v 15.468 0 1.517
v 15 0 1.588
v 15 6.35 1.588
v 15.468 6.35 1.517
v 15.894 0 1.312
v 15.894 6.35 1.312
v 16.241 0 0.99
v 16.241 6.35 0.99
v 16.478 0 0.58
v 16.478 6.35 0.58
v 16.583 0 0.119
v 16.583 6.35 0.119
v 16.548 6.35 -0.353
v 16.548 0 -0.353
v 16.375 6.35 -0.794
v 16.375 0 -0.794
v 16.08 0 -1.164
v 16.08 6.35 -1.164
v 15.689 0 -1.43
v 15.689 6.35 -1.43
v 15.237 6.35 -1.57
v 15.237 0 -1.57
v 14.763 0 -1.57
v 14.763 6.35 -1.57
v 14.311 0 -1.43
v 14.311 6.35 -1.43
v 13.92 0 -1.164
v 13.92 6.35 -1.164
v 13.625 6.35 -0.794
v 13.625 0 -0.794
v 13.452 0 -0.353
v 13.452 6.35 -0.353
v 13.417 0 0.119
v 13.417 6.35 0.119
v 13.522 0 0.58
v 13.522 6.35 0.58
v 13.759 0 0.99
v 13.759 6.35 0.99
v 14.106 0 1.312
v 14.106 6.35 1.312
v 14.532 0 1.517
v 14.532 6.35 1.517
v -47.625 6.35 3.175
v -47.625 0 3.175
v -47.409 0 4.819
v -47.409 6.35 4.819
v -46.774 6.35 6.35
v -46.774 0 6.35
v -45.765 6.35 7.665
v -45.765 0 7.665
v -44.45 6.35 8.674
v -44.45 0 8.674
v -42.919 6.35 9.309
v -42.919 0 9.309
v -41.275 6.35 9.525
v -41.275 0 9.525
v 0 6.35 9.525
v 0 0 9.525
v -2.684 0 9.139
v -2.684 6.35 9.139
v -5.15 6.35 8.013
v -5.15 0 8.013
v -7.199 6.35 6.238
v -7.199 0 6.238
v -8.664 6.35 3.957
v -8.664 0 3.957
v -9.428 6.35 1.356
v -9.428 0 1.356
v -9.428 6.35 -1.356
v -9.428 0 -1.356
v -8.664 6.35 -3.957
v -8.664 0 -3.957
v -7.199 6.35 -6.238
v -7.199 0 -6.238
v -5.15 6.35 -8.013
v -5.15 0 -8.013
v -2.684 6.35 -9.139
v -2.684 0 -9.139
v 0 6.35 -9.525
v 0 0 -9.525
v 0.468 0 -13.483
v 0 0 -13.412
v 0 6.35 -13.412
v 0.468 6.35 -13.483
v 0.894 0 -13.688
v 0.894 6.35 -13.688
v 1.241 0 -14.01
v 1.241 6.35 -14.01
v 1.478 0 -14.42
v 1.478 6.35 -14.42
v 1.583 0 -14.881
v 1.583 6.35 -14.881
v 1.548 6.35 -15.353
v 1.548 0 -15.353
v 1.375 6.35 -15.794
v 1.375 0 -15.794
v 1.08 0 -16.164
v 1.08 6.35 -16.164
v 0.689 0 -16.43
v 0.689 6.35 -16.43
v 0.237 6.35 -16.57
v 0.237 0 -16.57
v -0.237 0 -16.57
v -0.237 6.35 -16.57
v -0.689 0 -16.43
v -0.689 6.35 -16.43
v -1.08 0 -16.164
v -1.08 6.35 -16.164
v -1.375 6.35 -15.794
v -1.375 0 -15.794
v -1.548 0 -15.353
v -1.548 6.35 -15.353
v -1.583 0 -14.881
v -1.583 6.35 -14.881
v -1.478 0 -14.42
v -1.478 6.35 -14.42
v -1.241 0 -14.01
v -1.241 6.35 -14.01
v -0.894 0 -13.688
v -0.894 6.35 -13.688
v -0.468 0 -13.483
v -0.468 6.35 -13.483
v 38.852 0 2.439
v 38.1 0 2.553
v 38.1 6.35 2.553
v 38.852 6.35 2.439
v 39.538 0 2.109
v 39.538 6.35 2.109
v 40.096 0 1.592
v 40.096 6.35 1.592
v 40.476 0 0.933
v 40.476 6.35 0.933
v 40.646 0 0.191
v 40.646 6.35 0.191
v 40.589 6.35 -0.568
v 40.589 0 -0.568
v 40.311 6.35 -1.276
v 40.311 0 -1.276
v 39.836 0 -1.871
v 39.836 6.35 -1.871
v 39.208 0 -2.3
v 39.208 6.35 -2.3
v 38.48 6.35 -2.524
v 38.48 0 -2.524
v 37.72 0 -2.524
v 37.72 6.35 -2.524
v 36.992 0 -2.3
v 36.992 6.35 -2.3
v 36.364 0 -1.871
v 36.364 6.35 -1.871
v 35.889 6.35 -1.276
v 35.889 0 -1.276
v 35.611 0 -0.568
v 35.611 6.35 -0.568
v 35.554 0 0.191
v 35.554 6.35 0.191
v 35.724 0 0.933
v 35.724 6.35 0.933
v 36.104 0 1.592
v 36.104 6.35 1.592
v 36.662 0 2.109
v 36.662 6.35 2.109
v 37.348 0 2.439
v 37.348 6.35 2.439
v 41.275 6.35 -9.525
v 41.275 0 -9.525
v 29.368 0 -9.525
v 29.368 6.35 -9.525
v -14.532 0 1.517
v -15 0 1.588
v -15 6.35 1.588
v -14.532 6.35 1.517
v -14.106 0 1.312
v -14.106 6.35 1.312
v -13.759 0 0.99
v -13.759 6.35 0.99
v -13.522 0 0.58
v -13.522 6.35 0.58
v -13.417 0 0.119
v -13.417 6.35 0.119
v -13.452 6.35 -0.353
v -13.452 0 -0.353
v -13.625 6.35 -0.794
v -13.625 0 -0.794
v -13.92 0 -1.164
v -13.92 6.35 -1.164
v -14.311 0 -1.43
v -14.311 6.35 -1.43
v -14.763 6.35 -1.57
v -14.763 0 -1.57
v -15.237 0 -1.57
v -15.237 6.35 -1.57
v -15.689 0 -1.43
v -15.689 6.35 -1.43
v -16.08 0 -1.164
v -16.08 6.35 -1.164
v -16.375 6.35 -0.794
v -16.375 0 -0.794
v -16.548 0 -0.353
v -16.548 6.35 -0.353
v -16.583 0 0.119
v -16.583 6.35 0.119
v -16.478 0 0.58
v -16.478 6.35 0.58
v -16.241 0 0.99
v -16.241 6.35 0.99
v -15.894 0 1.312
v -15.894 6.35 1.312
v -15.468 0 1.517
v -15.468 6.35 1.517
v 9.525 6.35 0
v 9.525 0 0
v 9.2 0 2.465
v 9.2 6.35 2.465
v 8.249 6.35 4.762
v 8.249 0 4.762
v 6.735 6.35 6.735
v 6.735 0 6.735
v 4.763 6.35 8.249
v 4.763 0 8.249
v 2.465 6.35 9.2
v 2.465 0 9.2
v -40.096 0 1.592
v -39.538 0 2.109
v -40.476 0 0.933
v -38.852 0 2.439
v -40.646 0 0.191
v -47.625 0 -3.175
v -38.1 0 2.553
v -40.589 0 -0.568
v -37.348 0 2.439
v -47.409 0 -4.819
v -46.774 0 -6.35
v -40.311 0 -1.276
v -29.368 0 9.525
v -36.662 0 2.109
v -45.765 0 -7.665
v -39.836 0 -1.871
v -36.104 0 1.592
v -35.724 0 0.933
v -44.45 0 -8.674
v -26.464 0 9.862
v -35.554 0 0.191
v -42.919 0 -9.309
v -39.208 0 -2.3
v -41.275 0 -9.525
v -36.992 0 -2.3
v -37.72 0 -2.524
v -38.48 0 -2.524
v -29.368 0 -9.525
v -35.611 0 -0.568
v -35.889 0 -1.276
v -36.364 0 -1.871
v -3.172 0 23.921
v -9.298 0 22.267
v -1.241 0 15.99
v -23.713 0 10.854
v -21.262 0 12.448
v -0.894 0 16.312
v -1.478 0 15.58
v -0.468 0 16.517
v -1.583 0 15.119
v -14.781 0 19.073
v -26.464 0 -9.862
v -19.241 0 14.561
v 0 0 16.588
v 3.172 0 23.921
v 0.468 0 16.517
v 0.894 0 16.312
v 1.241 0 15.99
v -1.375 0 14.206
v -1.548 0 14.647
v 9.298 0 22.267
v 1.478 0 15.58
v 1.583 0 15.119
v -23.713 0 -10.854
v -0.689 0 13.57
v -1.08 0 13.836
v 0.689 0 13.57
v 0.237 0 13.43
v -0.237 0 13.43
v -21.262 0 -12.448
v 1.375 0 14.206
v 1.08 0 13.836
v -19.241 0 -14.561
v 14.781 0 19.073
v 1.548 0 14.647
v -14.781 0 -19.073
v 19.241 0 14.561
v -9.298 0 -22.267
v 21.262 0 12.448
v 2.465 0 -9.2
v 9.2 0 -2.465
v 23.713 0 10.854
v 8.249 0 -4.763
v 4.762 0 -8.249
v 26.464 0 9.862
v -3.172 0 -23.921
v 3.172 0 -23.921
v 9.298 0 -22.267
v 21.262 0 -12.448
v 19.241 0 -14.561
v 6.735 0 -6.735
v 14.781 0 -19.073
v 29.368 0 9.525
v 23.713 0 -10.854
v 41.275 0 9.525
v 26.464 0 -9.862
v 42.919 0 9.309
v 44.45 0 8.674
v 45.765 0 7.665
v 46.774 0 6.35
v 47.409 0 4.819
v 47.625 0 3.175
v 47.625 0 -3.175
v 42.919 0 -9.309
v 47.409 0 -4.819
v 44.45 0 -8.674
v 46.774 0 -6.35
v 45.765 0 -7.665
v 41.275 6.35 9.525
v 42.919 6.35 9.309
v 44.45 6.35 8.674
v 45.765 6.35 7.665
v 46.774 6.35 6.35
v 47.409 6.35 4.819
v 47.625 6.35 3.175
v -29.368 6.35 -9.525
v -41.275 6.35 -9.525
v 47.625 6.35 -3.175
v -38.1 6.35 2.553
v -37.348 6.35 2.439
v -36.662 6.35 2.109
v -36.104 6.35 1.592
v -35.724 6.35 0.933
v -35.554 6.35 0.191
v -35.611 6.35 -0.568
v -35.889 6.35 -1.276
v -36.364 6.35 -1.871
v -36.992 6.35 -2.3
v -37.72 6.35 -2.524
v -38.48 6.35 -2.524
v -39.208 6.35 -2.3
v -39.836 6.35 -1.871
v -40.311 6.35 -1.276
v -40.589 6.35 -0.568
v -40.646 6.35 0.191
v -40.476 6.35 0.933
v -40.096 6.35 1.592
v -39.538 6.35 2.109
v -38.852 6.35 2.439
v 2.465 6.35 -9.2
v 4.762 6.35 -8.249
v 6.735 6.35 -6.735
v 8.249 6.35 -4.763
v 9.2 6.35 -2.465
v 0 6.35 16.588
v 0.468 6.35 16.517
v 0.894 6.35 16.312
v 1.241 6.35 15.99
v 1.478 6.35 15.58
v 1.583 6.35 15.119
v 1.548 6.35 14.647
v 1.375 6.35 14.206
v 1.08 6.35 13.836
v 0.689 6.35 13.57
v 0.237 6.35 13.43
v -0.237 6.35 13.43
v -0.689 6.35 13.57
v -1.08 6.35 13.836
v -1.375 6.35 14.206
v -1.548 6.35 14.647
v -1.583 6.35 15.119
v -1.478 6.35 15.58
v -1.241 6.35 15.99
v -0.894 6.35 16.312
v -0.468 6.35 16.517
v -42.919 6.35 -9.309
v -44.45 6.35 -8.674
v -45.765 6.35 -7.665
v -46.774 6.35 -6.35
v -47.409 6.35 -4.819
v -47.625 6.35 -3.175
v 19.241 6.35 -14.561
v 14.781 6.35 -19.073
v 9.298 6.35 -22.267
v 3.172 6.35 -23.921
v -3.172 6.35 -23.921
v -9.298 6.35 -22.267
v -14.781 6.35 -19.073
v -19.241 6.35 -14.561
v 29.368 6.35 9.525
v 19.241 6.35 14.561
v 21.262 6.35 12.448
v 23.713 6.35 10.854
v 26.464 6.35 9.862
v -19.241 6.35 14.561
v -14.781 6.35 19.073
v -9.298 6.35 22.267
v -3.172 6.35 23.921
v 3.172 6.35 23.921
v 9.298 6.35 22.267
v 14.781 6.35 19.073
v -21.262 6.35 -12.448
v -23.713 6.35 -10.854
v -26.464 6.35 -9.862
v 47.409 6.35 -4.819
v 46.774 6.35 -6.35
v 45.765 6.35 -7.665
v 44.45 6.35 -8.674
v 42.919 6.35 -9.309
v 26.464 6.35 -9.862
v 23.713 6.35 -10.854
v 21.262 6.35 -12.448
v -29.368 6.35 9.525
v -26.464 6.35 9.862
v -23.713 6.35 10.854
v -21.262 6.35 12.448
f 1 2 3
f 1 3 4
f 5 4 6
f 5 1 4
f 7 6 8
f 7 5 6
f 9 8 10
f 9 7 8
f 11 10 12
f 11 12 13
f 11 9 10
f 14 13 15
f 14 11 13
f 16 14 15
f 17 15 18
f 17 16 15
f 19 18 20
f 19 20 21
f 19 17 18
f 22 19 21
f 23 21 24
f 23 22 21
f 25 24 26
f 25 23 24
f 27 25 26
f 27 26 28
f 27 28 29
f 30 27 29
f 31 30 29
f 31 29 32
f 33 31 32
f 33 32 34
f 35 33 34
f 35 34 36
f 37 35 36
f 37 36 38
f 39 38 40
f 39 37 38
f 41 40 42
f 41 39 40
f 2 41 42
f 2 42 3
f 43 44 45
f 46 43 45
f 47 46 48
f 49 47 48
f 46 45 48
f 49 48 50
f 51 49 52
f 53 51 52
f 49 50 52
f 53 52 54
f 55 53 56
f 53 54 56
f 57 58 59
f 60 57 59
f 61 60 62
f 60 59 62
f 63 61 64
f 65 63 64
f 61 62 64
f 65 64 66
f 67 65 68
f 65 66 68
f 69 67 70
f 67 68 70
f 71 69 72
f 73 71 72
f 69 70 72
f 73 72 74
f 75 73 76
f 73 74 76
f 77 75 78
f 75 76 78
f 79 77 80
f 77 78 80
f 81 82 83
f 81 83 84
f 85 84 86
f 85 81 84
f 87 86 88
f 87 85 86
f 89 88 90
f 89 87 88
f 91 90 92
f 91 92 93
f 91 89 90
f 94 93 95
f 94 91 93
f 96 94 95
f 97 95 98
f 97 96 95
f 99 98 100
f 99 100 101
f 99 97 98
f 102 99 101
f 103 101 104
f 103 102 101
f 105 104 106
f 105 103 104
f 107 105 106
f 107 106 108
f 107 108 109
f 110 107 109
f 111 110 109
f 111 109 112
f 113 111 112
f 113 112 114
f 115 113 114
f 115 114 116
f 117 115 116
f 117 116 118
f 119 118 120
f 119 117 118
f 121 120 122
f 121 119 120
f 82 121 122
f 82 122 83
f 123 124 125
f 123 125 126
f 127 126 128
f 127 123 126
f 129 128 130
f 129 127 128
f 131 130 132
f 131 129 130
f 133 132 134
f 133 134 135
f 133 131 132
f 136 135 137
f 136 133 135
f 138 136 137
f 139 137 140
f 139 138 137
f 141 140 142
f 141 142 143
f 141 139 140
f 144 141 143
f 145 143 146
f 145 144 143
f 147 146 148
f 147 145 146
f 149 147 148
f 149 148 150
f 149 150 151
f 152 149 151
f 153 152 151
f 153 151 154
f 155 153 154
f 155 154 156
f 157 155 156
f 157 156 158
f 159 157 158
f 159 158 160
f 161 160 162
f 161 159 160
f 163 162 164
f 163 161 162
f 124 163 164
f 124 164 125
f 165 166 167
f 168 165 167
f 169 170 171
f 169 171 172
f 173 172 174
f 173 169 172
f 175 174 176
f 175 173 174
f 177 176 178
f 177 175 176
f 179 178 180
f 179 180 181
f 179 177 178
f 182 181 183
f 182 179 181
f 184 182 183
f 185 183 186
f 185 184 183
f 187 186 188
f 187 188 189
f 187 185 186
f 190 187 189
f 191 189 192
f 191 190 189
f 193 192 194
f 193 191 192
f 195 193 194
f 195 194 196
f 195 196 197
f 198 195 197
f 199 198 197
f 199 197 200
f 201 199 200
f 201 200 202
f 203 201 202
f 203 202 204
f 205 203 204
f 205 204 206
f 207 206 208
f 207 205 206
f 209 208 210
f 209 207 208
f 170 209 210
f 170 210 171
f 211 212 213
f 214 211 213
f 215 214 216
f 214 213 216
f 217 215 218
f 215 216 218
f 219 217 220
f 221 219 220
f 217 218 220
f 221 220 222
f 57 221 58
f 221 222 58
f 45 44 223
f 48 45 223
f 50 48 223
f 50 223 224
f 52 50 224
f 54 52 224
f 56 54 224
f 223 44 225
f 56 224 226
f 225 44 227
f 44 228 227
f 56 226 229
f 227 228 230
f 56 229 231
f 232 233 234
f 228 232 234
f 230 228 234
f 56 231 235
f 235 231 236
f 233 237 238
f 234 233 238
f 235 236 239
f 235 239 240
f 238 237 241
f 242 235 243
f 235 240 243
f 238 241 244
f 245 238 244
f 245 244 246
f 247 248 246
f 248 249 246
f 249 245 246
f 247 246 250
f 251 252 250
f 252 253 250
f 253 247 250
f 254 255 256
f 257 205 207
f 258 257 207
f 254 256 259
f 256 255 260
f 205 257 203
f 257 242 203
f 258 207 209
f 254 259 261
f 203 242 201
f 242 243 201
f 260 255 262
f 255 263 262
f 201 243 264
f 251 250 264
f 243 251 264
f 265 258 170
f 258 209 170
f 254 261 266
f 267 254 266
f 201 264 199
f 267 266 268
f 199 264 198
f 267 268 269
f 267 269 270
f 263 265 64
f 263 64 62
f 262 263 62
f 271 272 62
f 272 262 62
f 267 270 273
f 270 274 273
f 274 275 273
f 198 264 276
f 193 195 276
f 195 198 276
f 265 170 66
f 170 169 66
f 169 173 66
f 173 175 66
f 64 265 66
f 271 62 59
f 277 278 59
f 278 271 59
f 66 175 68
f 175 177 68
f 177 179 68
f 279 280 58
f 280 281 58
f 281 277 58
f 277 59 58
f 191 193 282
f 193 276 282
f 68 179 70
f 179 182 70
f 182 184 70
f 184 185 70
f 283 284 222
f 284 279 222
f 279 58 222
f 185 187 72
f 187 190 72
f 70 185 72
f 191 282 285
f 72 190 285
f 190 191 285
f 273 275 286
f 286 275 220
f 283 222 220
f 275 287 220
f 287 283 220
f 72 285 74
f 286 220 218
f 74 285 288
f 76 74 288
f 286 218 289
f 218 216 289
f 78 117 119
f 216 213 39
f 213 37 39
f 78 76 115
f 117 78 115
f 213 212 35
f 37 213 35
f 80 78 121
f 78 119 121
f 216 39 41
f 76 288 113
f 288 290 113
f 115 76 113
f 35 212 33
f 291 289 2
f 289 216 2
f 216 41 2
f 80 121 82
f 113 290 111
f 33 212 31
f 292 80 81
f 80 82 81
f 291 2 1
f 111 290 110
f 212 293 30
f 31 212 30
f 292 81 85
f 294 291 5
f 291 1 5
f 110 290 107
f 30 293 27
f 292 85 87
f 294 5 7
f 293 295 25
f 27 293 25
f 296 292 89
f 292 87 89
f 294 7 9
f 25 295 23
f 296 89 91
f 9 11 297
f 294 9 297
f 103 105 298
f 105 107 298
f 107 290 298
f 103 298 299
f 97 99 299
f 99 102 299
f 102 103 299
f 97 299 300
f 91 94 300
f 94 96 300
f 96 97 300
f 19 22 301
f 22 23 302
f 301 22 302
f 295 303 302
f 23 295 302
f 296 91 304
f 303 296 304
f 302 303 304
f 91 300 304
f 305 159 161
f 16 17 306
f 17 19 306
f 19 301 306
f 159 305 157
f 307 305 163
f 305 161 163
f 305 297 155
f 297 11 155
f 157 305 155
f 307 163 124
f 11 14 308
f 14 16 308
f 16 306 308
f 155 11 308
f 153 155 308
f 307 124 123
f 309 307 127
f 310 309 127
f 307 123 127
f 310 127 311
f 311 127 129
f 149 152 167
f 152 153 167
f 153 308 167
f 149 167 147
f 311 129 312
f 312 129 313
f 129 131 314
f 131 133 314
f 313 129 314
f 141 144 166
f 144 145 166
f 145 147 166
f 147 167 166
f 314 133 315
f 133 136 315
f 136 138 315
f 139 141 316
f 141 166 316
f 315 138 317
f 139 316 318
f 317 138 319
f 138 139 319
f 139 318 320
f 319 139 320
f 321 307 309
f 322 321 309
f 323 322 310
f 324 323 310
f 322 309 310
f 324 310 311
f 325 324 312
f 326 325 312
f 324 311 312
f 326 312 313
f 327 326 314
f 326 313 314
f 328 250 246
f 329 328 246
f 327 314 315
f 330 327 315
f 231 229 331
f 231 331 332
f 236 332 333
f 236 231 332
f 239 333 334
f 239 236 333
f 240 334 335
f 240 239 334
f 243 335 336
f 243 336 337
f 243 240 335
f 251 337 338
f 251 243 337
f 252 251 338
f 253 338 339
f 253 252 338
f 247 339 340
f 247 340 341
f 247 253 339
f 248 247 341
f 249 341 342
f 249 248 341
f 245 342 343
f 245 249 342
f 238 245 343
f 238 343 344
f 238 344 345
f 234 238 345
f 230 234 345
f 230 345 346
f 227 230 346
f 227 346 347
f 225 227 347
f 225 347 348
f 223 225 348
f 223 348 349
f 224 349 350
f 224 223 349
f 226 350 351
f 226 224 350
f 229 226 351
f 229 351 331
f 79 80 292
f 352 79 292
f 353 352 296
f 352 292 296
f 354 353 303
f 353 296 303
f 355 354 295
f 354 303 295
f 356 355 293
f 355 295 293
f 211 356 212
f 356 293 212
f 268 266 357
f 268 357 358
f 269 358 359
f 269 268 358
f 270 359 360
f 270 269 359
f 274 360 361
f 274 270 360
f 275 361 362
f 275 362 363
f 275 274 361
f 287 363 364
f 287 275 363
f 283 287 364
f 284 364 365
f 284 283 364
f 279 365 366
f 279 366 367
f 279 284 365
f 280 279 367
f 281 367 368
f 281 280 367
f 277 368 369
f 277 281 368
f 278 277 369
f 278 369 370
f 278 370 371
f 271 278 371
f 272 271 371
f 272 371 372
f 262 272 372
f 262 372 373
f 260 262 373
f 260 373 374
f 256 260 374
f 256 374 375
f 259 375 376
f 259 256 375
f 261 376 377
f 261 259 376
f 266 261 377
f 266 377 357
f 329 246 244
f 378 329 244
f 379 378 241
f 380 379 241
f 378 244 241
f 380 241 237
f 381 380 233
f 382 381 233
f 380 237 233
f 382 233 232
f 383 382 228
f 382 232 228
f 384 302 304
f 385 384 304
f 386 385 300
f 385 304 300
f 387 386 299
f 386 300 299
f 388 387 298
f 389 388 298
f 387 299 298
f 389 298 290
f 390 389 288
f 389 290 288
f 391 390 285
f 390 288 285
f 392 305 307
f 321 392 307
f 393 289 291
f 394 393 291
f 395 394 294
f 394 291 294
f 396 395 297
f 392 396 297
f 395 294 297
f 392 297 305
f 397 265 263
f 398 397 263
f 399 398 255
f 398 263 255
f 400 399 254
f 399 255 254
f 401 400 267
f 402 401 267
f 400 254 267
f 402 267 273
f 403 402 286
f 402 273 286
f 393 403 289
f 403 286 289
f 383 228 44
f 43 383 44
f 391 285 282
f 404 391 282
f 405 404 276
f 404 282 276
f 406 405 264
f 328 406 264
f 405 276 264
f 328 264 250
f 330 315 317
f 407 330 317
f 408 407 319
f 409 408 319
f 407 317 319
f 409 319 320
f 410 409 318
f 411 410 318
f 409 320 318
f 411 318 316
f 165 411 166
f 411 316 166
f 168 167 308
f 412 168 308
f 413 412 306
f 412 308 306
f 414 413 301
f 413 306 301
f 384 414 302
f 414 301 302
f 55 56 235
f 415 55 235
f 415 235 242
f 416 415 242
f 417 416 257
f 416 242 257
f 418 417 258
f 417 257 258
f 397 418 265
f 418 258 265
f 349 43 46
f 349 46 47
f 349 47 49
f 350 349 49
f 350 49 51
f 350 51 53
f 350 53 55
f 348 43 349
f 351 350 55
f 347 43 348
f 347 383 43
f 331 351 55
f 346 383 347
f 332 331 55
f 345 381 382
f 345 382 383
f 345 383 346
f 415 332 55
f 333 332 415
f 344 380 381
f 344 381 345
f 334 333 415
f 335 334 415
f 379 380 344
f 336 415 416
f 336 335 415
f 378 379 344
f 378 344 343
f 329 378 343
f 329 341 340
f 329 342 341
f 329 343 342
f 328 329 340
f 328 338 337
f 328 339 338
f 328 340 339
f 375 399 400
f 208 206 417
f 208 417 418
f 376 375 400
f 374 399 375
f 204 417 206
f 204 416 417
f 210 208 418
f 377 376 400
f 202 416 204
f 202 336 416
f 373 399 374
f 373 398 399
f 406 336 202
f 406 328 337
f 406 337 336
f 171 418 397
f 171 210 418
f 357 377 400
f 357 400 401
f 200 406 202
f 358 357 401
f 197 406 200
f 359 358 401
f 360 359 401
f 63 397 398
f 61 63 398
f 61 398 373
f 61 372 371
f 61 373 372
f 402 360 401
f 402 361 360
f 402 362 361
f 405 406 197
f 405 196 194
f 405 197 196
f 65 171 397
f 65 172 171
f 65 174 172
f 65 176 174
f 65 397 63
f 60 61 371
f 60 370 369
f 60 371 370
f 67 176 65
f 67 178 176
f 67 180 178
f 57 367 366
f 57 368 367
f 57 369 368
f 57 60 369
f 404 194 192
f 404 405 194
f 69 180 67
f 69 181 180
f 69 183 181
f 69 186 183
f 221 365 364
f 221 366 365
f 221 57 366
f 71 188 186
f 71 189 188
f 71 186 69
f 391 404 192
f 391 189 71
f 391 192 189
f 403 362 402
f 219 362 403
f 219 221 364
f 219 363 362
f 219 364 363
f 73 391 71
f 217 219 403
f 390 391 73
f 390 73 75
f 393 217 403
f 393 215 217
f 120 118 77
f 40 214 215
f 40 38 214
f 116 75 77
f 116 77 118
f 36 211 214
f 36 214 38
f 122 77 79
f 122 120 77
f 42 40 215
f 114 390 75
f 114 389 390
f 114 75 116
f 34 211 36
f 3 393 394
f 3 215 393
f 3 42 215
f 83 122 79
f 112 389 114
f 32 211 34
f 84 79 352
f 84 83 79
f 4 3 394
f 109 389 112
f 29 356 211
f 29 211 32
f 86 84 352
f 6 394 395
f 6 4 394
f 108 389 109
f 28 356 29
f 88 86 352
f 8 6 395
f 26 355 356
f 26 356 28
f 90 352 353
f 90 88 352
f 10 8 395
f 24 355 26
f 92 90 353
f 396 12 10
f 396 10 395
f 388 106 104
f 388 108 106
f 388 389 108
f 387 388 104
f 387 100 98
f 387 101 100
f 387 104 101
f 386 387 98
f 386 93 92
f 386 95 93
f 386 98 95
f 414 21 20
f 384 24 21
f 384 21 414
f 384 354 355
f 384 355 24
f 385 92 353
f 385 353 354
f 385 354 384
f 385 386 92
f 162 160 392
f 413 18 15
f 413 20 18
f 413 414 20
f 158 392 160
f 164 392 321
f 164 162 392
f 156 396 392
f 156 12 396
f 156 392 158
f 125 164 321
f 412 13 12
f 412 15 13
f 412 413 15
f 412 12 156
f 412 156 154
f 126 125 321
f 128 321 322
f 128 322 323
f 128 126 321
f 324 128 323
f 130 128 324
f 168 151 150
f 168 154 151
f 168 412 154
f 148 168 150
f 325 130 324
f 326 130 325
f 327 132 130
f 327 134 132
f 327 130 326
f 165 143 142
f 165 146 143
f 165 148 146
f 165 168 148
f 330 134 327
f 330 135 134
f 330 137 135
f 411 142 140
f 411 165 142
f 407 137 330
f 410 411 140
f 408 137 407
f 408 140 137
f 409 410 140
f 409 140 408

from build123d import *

# Parameters (mm, degrees)
SKETCH1_R           = 1.5875
SKETCH1_R_2         = 2.5527
BOSS_EXTRUDE2_DEPTH = 6.35


with BuildPart() as part:
    # Sketch1 → Boss-Extrude2 (new body)
    # profile 1 of 10: a face of its own
    with BuildSketch(Plane(origin=(0, 0, 0), x_dir=(1, 0, 0), z_dir=(0, 1, 0))):
        with BuildLine():
            Line((-4.5e-08, 9.525), (-22.170504618, 9.525))
            ThreePointArc((-22.170504618, 9.525), (-24.13, 0), (-22.170504618, -9.525))
            Line((-22.170504618, -9.525), (4.2e-08, -9.525))
            ThreePointArc((4.2e-08, -9.525), (-9.525, -4.4e-08), (-4.5e-08, 9.525))
        make_face()
        with Locations(Location((-15, 0, 0), (0, 0, 270))):
            Circle(SKETCH1_R, mode=Mode.SUBTRACT)
    # profile 2 of 10: a face of its own
    with BuildSketch(Plane(origin=(0, 0, 0), x_dir=(1, 0, 0), z_dir=(0, 1, 0))):
        with BuildLine():
            Line((22.170504618, 9.525), (-4.5e-08, 9.525))
            ThreePointArc((-4.5e-08, 9.525), (6.735192075, 6.735192107), (9.525, 0))
            ThreePointArc((9.525, 0), (6.735192106, -6.735192076), (4.2e-08, -9.525))
            Line((4.2e-08, -9.525), (22.170504618, -9.525))
            ThreePointArc((22.170504618, -9.525), (23.635049994, -4.86223321), (24.13, 0))
            ThreePointArc((24.13, 0), (23.635049994, 4.86223321), (22.170504618, 9.525))
        make_face()
        with Locations(Location((15, 0, 0), (0, 0, 270))):
            Circle(SKETCH1_R, mode=Mode.SUBTRACT)
    # profile 3 of 10: a face of its own
    with BuildSketch(Plane(origin=(0, 0, 0), x_dir=(1, 0, 0), z_dir=(0, 1, 0))):
        with BuildLine():
            Line((4.2e-08, -9.525), (-22.170504618, -9.525))
            ThreePointArc((-22.170504618, -9.525), (-20.858463978, -12.131833353), (-19.241313721, -14.561206897))
            ThreePointArc((-19.241313721, -14.561206897), (0, -24.13), (19.241313721, -14.561206897))
            ThreePointArc((19.241313721, -14.561206897), (20.858463978, -12.131833353), (22.170504618, -9.525))
            Line((22.170504618, -9.525), (4.2e-08, -9.525))
        make_face()
        with Locations(Location((0, -15, 0), (0, 0, 270))):
            Circle(SKETCH1_R, mode=Mode.SUBTRACT)
    # profile 4 of 10: a face of its own
    with BuildSketch(Plane(origin=(0, 0, 0), x_dir=(1, 0, 0), z_dir=(0, 1, 0))):
        with BuildLine():
            ThreePointArc((-19.241313721, 14.561206897), (-20.858463978, 12.131833353), (-22.170504618, 9.525))
            Line((-22.170504618, 9.525), (-4.5e-08, 9.525))
            Line((-4.5e-08, 9.525), (22.170504618, 9.525))
            ThreePointArc((22.170504618, 9.525), (20.858463978, 12.131833353), (19.241313721, 14.561206897))
            ThreePointArc((19.241313721, 14.561206897), (0, 24.13), (-19.241313721, 14.561206897))
        make_face()
        with Locations(Location((0, 15, 0), (0, 0, 270))):
            Circle(SKETCH1_R, mode=Mode.SUBTRACT)
    # profile 5 of 10: a face of its own
    with BuildSketch(Plane(origin=(0, 0, 0), x_dir=(1, 0, 0), z_dir=(0, 1, 0))):
        with BuildLine():
            Line((-29.368320943, 9.525), (-41.275, 9.525))
            ThreePointArc((-41.275, 9.525), (-45.765128061, 7.665128061), (-47.625, 3.175))
            Line((-47.625, 3.175), (-47.625, -3.175))
            ThreePointArc((-47.625, -3.175), (-45.765128061, -7.665128061), (-41.275, -9.525))
            Line((-41.275, -9.525), (-29.368320943, -9.525))
            Line((-29.368320943, -9.525), (-22.170504618, -9.525))
            ThreePointArc((-22.170504618, -9.525), (-24.13, 0), (-22.170504618, 9.525))
            Line((-22.170504618, 9.525), (-29.368320943, 9.525))
        make_face()
        with Locations(Location((-38.1, 0, 0), (0, 0, 270))):
            Circle(SKETCH1_R_2, mode=Mode.SUBTRACT)
    # profile 6 of 10: a face of its own
    with BuildSketch(Plane(origin=(0, 0, 0), x_dir=(1, 0, 0), z_dir=(0, 1, 0))):
        with BuildLine():
            Line((29.368320943, 9.525), (22.170504618, 9.525))
            ThreePointArc((22.170504618, 9.525), (23.635049994, 4.86223321), (24.13, 0))
            ThreePointArc((24.13, 0), (23.635049994, -4.86223321), (22.170504618, -9.525))
            Line((22.170504618, -9.525), (29.368320943, -9.525))
            Line((29.368320943, -9.525), (41.275, -9.525))
            ThreePointArc((41.275, -9.525), (45.765128061, -7.665128061), (47.625, -3.175))
            Line((47.625, -3.175), (47.625, 3.175))
            ThreePointArc((47.625, 3.175), (45.765128061, 7.665128061), (41.275, 9.525))
            Line((41.275, 9.525), (29.368320943, 9.525))
        make_face()
        with Locations(Location((38.1, 0, 0), (0, 0, 270))):
            Circle(SKETCH1_R_2, mode=Mode.SUBTRACT)
    # profile 7 of 10: a face of its own
    with BuildSketch(Plane(origin=(0, 0, 0), x_dir=(1, 0, 0), z_dir=(0, 1, 0))):
        with BuildLine():
            ThreePointArc((-19.241313721, 14.561206897), (-23.713242359, 10.853540718), (-29.368320943, 9.525))
            Line((-29.368320943, 9.525), (-22.170504618, 9.525))
            ThreePointArc((-22.170504618, 9.525), (-20.858463978, 12.131833353), (-19.241313721, 14.561206897))
        make_face()
    # profile 8 of 10: a face of its own
    with BuildSketch(Plane(origin=(0, 0, 0), x_dir=(1, 0, 0), z_dir=(0, 1, 0))):
        with BuildLine():
            ThreePointArc((-19.241313721, -14.561206897), (-20.858463978, -12.131833353), (-22.170504618, -9.525))
            Line((-22.170504618, -9.525), (-29.368320943, -9.525))
            ThreePointArc((-29.368320943, -9.525), (-23.713242359, -10.853540718), (-19.241313721, -14.561206897))
        make_face()
    # profile 9 of 10: a face of its own
    with BuildSketch(Plane(origin=(0, 0, 0), x_dir=(1, 0, 0), z_dir=(0, 1, 0))):
        with BuildLine():
            ThreePointArc((29.368320943, 9.525), (23.713242359, 10.853540718), (19.241313721, 14.561206897))
            ThreePointArc((19.241313721, 14.561206897), (20.858463978, 12.131833353), (22.170504618, 9.525))
            Line((22.170504618, 9.525), (29.368320943, 9.525))
        make_face()
    # profile 10 of 10: a face of its own
    with BuildSketch(Plane(origin=(0, 0, 0), x_dir=(1, 0, 0), z_dir=(0, 1, 0))):
        with BuildLine():
            Line((29.368320943, -9.525), (22.170504618, -9.525))
            ThreePointArc((22.170504618, -9.525), (20.858463978, -12.131833353), (19.241313721, -14.561206897))
            ThreePointArc((19.241313721, -14.561206897), (23.713242359, -10.853540718), (29.368320943, -9.525))
        make_face()
    extrude(amount=BOSS_EXTRUDE2_DEPTH)


solid = part.part
